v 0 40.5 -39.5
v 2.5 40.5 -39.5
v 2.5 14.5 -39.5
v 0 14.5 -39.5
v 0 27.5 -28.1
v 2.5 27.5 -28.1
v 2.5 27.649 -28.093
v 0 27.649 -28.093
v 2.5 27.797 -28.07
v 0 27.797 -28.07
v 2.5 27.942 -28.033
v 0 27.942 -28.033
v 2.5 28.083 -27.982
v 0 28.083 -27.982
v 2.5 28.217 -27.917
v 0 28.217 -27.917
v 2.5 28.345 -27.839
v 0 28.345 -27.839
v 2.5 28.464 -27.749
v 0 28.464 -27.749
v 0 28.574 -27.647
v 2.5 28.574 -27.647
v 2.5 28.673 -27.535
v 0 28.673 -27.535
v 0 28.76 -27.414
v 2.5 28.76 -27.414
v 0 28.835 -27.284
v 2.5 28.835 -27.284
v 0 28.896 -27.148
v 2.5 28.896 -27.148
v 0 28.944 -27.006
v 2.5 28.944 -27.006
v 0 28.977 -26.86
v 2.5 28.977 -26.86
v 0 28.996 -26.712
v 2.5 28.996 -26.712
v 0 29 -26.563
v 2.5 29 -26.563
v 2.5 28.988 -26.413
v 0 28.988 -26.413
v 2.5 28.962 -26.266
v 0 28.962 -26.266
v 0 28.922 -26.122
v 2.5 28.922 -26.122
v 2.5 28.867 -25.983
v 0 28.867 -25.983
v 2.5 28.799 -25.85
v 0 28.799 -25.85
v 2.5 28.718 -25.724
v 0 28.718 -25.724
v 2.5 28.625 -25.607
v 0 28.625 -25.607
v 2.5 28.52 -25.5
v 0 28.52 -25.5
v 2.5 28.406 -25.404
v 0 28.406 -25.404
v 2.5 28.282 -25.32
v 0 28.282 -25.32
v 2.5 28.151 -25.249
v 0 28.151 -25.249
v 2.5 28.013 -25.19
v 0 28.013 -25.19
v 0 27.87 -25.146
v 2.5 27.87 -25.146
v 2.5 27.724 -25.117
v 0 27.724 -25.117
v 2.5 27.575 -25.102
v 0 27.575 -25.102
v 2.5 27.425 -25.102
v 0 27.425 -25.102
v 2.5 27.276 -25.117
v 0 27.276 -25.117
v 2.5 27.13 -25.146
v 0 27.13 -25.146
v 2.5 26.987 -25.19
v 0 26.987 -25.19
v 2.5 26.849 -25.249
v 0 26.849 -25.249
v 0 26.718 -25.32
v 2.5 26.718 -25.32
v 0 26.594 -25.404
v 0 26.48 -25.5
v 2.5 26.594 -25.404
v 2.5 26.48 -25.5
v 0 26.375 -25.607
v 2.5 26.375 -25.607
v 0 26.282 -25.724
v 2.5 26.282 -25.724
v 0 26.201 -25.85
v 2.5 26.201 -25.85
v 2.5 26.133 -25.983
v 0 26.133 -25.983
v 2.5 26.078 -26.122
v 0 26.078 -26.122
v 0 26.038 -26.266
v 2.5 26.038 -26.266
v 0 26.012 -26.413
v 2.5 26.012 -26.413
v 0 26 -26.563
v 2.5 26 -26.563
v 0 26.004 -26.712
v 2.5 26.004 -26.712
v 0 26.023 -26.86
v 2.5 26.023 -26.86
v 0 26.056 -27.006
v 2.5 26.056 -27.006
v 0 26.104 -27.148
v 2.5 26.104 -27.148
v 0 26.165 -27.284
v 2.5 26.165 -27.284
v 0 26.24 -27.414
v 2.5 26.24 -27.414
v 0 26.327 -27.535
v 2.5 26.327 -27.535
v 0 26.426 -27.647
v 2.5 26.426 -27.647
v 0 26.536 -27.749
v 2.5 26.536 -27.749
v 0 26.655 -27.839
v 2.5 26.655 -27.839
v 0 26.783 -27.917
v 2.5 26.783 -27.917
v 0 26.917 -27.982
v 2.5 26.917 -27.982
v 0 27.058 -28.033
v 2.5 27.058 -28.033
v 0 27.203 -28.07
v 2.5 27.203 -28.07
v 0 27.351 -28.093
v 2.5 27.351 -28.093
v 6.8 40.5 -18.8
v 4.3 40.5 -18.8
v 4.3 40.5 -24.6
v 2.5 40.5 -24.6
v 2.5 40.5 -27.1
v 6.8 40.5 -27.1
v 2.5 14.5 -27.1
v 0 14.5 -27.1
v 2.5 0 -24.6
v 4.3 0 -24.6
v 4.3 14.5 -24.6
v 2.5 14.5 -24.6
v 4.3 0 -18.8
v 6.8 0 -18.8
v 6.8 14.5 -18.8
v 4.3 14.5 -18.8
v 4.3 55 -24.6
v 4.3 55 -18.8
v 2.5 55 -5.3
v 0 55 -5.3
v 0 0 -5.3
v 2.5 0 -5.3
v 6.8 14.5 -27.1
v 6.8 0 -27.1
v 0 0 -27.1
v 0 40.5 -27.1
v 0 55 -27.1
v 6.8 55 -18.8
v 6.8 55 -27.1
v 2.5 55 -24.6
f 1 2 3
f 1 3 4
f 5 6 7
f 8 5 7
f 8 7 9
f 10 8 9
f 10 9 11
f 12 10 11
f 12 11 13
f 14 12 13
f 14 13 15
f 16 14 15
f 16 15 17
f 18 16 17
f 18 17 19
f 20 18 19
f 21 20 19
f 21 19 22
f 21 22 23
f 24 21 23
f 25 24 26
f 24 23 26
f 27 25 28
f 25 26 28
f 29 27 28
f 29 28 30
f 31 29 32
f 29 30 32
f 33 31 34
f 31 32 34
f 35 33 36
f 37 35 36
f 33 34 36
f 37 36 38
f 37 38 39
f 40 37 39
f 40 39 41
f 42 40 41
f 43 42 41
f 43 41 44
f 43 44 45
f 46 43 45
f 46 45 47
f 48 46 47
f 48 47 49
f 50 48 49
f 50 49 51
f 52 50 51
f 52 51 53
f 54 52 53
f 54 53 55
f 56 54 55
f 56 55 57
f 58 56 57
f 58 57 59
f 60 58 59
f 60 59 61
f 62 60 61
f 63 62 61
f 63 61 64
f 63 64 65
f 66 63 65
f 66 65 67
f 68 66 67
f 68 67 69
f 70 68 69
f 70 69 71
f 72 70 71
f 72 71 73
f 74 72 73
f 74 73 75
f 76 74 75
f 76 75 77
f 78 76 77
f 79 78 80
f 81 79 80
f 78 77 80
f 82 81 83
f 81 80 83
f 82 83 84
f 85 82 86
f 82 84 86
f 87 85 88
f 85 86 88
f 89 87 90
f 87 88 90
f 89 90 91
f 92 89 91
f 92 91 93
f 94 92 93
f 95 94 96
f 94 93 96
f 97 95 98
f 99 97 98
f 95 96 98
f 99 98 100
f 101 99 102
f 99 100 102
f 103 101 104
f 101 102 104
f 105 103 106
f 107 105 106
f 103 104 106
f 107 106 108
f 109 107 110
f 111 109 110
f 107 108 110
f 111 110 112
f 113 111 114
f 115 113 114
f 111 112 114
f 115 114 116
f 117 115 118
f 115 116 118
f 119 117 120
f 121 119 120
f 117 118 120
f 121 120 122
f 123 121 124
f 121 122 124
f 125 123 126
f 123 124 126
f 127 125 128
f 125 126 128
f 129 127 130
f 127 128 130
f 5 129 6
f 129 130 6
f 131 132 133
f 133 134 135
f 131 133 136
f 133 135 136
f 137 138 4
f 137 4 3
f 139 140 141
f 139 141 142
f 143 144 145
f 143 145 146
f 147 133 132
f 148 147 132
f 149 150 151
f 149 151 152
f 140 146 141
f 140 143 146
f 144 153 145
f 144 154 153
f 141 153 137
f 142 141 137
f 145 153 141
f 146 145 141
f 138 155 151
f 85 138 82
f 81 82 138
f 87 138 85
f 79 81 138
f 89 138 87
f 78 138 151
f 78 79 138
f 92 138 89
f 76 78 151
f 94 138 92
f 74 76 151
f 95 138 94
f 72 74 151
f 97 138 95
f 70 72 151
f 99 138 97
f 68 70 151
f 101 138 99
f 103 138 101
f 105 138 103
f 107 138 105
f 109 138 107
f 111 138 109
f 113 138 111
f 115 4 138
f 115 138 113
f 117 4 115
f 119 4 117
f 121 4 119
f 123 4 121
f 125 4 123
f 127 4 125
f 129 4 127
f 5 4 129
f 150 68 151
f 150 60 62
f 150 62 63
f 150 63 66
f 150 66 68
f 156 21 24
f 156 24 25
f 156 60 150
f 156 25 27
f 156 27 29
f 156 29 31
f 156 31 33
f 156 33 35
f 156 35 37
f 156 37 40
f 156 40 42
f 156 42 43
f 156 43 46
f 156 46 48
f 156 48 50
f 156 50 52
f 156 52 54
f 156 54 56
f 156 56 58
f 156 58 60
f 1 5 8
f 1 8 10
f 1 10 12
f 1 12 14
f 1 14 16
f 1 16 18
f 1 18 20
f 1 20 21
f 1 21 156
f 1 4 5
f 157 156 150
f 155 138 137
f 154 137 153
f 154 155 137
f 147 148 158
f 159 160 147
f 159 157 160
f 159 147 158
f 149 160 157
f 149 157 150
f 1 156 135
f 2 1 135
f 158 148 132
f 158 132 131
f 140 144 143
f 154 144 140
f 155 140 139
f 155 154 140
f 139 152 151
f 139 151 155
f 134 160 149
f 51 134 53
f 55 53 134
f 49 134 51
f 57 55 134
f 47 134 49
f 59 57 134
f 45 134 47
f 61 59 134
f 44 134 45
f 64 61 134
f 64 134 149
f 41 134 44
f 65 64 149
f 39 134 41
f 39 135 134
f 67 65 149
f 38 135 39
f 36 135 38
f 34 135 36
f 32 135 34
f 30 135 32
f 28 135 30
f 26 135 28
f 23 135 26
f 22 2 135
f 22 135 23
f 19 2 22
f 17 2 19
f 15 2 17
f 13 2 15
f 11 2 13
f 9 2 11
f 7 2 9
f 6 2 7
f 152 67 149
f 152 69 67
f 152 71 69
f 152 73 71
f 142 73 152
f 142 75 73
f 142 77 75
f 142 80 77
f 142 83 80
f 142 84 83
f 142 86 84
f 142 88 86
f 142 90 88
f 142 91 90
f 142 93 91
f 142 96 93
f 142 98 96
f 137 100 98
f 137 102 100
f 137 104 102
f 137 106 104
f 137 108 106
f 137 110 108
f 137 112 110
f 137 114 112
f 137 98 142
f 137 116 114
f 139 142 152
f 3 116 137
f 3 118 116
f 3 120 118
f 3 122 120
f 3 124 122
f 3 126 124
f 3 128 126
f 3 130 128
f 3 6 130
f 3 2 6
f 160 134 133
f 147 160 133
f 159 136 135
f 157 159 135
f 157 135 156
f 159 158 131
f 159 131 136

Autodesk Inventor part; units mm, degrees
ref_plane "YZ Plane" through (0, 0, 0) normal (1, 0, 0) x (0, 1, 0)
ref_plane "XZ Plane" through (0, 0, 0) normal (0, 1, 0) x (-1, 0, 0)
ref_plane "XY Plane" through (0, 0, 0) normal (0, 0, 1) x (1, 0, 0)
sketch "Sketch1" plane through (0, 0, 0) normal (0, 1, 0) x (-1, 0, 0)
  line L0 (0, 27.1) -> (0, -27.1)
  line L1 (0, 27.1) -> (-6.8, 27.1)
  line L2 (-6.8, 27.1) -> (-6.8, 18.8)
  line L3 (-6.8, 18.8) -> (-4.3, 18.8)
  line L4 (-4.3, 18.8) -> (-4.3, 24.6)
  line L5 (-4.3, 24.6) -> (-2.5, 24.6)
  line L6 (-2.5, 24.6) -> (-2.5, 0)
  line L7 (0, -27.1) -> (-6.8, -27.1)
  line L8 (-6.8, -27.1) -> (-6.8, -18.8)
  line L9 (-6.8, -18.8) -> (-4.3, -18.8)
  line L10 (-4.3, -18.8) -> (-4.3, -24.6)
  line L11 (-4.3, -24.6) -> (-2.5, -24.6)
  line L12 (-2.5, -24.6) -> (-2.5, 0)
  point P0 (0, 0)
  dimension "d0" = 54.2
  dimension "d1" = 6.8
  dimension "d2" = 8.3
  dimension "d3" = 2.5
  dimension "d4" = 5.8
  dimension "d5" = 1.8
  dimension "d6" = 8.3
  dimension "d7" = 5.8
extrude "Extrusion1" add sketch "Sketch1" along normal blind 14.5
sketch "Sketch2" plane through (0, 14.5, 0) normal (0, 1, 0) x (1, 0, 0)
  line L0 (2.5, -24.6) -> (2.5, 24.6) projected
  line L1 (2.5, 0) -> (2.5, 39.5)
  line L2 (2.5, 39.5) -> (0, 39.5)
  line L3 (0, 39.5) -> (0, 0)
  line L4 (0, 0) -> (0, -39.5)
  line L5 (0, 27.1) -> (0, -27.1) projected
  line L6 (0, -39.5) -> (2.5, -39.5)
  line L7 (2.5, -39.5) -> (2.5, 0)
  dimension "d10" = 39.5
  dimension "d11" = 39.5
extrude "Extrusion2" add sketch "Sketch2" along normal blind 26
sketch "Sketch3" plane through (0, 40.5, 0) normal (0, 1, 0) x (1, 0, 0)
  line L0 (2.5, -24.6) -> (2.5, 24.6) projected
  line L1 (2.5, 0) -> (2.5, 24.6558)
  line L2 (0, 27.1) -> (0, -27.1) projected
  line L3 (4.3, -24.6) -> (2.5, -24.6) projected
  line L4 (6.8, -18.8) -> (4.3, -18.8) projected
  line L5 (4.3, -24.6) -> (4.3, -18.8)
  line L6 (4.3, -18.8) -> (6.8, -18.8)
  line L7 (6.8, -18.8) -> (6.8, -27.1)
  line L8 (6.8, -27.1) -> (2.5, -27.1)
  line L9 (2.5, 0) -> (2.5, 24.6558)
  line L10 (2.5, 24.6) -> (4.3, 24.6) projected
  line L11 (4.3, 18.8) -> (6.8, 18.8) projected
  line L12 (4.3, 24.6) -> (4.3, 18.8)
  line L13 (4.3, 18.8) -> (6.8, 18.8)
  line L14 (6.8, 18.8) -> (6.8, 27.1)
  line L15 (6.8, 27.1) -> (0, 27.1)
  line L16 (0, 27.1) -> (0, -27.1)
  line L17 (6.8, -27.1) -> (0, -27.1)
  line L18 (4.3, -24.6) -> (2.5, -24.6)
  point P0 (0, 0)
extrude "Extrusion3" add sketch "Sketch3" along normal blind 14.5
sketch "Sketch4" plane through (2.5, 0, 24.6) normal (1, 0, 0) x (0, 0, -1)
  line L0 (64.1, 14.5) -> (64.1, 40.5) projected
  line L1 (-14.9, 14.5) -> (-14.9, 40.5) projected
  line L2 (-14.9, 27.5) -> (-1.5, 27.5)
  circle A0 centre (-1.5, 27.5) radius 1.5
  line L3 (64.1, 14.5) -> (64.1, 40.5) projected
  line L4 (64.1, 27.5) -> (51.2, 27.5)
  circle A1 centre (51.2, 27.5) radius 1.5
  point P0 (24.6, 0)
  dimension "d18" = 13.4
  dimension "d19" = 3
  dimension "d31" = 12.9
extrude "Extrusion4" cut sketch "Sketch4" against normal blind 4.5
sketch "Sketch5" plane through (0, 0, -27.1) normal (-1, 0, 0) x (0, 0, 1)
  line L0 (27.1, 0) -> (21.3, 0)
  line L1 (51.7, 0) -> (2.5, 0) projected
  line L2 (21.3, 0) -> (21.3, 55)
  line L3 (51.7, 55) -> (2.5, 55) projected
  line L4 (27.1, 55) -> (32.9, 55)
  line L5 (32.9, 55) -> (32.9, 0)
  line L6 (32.9, 0) -> (27.1, 0)
  dimension "d22" = 5.8
  dimension "d23" = 5.8
extrude "Extrusion5" cut sketch "Sketch5" against normal blind 62.3875
sketch "Sketch6" plane through (0, 0, 5.8) normal (0, 0, -1) x (-1, 0, 0)
  point P0 (0, 0)
sketch "Sketch7" plane through (0, 14.5, 27.1) normal (-1, 0, 0) x (0, 0, 1)
  line L0 (-21.3, -14.5) -> (0, -14.5) projected
  line L1 (-21.3, -14.5) -> (18.5957, -14.5)
  line L2 (18.5957, -14.5) -> (18.5957, 49.9868)
  line L3 (18.5957, 49.9868) -> (-21.3, 49.9868)
  line L4 (-21.3, 49.9868) -> (-21.3, -14.5)
  point P0 (-27.1, -14.5)
extrude "Extrusion6" cut sketch "Sketch7" against normal blind 62.3875
sketch "Sketch8" plane through (0, 0, -5.8) normal (0, 0, 1) x (1, 0, 0)
  line L0 (0, 55) -> (2.5, 55)
  line L1 (2.5, 0) -> (0, 0) projected
  line L2 (2.5, 55) -> (2.5, 0)
  line L3 (2.5, 0) -> (0, 0)
  line L4 (0, 0) -> (0, 55)
extrude "Extrusion7" add sketch "Sketch8" along normal blind 0.5
properties part number "cam_holder3"
